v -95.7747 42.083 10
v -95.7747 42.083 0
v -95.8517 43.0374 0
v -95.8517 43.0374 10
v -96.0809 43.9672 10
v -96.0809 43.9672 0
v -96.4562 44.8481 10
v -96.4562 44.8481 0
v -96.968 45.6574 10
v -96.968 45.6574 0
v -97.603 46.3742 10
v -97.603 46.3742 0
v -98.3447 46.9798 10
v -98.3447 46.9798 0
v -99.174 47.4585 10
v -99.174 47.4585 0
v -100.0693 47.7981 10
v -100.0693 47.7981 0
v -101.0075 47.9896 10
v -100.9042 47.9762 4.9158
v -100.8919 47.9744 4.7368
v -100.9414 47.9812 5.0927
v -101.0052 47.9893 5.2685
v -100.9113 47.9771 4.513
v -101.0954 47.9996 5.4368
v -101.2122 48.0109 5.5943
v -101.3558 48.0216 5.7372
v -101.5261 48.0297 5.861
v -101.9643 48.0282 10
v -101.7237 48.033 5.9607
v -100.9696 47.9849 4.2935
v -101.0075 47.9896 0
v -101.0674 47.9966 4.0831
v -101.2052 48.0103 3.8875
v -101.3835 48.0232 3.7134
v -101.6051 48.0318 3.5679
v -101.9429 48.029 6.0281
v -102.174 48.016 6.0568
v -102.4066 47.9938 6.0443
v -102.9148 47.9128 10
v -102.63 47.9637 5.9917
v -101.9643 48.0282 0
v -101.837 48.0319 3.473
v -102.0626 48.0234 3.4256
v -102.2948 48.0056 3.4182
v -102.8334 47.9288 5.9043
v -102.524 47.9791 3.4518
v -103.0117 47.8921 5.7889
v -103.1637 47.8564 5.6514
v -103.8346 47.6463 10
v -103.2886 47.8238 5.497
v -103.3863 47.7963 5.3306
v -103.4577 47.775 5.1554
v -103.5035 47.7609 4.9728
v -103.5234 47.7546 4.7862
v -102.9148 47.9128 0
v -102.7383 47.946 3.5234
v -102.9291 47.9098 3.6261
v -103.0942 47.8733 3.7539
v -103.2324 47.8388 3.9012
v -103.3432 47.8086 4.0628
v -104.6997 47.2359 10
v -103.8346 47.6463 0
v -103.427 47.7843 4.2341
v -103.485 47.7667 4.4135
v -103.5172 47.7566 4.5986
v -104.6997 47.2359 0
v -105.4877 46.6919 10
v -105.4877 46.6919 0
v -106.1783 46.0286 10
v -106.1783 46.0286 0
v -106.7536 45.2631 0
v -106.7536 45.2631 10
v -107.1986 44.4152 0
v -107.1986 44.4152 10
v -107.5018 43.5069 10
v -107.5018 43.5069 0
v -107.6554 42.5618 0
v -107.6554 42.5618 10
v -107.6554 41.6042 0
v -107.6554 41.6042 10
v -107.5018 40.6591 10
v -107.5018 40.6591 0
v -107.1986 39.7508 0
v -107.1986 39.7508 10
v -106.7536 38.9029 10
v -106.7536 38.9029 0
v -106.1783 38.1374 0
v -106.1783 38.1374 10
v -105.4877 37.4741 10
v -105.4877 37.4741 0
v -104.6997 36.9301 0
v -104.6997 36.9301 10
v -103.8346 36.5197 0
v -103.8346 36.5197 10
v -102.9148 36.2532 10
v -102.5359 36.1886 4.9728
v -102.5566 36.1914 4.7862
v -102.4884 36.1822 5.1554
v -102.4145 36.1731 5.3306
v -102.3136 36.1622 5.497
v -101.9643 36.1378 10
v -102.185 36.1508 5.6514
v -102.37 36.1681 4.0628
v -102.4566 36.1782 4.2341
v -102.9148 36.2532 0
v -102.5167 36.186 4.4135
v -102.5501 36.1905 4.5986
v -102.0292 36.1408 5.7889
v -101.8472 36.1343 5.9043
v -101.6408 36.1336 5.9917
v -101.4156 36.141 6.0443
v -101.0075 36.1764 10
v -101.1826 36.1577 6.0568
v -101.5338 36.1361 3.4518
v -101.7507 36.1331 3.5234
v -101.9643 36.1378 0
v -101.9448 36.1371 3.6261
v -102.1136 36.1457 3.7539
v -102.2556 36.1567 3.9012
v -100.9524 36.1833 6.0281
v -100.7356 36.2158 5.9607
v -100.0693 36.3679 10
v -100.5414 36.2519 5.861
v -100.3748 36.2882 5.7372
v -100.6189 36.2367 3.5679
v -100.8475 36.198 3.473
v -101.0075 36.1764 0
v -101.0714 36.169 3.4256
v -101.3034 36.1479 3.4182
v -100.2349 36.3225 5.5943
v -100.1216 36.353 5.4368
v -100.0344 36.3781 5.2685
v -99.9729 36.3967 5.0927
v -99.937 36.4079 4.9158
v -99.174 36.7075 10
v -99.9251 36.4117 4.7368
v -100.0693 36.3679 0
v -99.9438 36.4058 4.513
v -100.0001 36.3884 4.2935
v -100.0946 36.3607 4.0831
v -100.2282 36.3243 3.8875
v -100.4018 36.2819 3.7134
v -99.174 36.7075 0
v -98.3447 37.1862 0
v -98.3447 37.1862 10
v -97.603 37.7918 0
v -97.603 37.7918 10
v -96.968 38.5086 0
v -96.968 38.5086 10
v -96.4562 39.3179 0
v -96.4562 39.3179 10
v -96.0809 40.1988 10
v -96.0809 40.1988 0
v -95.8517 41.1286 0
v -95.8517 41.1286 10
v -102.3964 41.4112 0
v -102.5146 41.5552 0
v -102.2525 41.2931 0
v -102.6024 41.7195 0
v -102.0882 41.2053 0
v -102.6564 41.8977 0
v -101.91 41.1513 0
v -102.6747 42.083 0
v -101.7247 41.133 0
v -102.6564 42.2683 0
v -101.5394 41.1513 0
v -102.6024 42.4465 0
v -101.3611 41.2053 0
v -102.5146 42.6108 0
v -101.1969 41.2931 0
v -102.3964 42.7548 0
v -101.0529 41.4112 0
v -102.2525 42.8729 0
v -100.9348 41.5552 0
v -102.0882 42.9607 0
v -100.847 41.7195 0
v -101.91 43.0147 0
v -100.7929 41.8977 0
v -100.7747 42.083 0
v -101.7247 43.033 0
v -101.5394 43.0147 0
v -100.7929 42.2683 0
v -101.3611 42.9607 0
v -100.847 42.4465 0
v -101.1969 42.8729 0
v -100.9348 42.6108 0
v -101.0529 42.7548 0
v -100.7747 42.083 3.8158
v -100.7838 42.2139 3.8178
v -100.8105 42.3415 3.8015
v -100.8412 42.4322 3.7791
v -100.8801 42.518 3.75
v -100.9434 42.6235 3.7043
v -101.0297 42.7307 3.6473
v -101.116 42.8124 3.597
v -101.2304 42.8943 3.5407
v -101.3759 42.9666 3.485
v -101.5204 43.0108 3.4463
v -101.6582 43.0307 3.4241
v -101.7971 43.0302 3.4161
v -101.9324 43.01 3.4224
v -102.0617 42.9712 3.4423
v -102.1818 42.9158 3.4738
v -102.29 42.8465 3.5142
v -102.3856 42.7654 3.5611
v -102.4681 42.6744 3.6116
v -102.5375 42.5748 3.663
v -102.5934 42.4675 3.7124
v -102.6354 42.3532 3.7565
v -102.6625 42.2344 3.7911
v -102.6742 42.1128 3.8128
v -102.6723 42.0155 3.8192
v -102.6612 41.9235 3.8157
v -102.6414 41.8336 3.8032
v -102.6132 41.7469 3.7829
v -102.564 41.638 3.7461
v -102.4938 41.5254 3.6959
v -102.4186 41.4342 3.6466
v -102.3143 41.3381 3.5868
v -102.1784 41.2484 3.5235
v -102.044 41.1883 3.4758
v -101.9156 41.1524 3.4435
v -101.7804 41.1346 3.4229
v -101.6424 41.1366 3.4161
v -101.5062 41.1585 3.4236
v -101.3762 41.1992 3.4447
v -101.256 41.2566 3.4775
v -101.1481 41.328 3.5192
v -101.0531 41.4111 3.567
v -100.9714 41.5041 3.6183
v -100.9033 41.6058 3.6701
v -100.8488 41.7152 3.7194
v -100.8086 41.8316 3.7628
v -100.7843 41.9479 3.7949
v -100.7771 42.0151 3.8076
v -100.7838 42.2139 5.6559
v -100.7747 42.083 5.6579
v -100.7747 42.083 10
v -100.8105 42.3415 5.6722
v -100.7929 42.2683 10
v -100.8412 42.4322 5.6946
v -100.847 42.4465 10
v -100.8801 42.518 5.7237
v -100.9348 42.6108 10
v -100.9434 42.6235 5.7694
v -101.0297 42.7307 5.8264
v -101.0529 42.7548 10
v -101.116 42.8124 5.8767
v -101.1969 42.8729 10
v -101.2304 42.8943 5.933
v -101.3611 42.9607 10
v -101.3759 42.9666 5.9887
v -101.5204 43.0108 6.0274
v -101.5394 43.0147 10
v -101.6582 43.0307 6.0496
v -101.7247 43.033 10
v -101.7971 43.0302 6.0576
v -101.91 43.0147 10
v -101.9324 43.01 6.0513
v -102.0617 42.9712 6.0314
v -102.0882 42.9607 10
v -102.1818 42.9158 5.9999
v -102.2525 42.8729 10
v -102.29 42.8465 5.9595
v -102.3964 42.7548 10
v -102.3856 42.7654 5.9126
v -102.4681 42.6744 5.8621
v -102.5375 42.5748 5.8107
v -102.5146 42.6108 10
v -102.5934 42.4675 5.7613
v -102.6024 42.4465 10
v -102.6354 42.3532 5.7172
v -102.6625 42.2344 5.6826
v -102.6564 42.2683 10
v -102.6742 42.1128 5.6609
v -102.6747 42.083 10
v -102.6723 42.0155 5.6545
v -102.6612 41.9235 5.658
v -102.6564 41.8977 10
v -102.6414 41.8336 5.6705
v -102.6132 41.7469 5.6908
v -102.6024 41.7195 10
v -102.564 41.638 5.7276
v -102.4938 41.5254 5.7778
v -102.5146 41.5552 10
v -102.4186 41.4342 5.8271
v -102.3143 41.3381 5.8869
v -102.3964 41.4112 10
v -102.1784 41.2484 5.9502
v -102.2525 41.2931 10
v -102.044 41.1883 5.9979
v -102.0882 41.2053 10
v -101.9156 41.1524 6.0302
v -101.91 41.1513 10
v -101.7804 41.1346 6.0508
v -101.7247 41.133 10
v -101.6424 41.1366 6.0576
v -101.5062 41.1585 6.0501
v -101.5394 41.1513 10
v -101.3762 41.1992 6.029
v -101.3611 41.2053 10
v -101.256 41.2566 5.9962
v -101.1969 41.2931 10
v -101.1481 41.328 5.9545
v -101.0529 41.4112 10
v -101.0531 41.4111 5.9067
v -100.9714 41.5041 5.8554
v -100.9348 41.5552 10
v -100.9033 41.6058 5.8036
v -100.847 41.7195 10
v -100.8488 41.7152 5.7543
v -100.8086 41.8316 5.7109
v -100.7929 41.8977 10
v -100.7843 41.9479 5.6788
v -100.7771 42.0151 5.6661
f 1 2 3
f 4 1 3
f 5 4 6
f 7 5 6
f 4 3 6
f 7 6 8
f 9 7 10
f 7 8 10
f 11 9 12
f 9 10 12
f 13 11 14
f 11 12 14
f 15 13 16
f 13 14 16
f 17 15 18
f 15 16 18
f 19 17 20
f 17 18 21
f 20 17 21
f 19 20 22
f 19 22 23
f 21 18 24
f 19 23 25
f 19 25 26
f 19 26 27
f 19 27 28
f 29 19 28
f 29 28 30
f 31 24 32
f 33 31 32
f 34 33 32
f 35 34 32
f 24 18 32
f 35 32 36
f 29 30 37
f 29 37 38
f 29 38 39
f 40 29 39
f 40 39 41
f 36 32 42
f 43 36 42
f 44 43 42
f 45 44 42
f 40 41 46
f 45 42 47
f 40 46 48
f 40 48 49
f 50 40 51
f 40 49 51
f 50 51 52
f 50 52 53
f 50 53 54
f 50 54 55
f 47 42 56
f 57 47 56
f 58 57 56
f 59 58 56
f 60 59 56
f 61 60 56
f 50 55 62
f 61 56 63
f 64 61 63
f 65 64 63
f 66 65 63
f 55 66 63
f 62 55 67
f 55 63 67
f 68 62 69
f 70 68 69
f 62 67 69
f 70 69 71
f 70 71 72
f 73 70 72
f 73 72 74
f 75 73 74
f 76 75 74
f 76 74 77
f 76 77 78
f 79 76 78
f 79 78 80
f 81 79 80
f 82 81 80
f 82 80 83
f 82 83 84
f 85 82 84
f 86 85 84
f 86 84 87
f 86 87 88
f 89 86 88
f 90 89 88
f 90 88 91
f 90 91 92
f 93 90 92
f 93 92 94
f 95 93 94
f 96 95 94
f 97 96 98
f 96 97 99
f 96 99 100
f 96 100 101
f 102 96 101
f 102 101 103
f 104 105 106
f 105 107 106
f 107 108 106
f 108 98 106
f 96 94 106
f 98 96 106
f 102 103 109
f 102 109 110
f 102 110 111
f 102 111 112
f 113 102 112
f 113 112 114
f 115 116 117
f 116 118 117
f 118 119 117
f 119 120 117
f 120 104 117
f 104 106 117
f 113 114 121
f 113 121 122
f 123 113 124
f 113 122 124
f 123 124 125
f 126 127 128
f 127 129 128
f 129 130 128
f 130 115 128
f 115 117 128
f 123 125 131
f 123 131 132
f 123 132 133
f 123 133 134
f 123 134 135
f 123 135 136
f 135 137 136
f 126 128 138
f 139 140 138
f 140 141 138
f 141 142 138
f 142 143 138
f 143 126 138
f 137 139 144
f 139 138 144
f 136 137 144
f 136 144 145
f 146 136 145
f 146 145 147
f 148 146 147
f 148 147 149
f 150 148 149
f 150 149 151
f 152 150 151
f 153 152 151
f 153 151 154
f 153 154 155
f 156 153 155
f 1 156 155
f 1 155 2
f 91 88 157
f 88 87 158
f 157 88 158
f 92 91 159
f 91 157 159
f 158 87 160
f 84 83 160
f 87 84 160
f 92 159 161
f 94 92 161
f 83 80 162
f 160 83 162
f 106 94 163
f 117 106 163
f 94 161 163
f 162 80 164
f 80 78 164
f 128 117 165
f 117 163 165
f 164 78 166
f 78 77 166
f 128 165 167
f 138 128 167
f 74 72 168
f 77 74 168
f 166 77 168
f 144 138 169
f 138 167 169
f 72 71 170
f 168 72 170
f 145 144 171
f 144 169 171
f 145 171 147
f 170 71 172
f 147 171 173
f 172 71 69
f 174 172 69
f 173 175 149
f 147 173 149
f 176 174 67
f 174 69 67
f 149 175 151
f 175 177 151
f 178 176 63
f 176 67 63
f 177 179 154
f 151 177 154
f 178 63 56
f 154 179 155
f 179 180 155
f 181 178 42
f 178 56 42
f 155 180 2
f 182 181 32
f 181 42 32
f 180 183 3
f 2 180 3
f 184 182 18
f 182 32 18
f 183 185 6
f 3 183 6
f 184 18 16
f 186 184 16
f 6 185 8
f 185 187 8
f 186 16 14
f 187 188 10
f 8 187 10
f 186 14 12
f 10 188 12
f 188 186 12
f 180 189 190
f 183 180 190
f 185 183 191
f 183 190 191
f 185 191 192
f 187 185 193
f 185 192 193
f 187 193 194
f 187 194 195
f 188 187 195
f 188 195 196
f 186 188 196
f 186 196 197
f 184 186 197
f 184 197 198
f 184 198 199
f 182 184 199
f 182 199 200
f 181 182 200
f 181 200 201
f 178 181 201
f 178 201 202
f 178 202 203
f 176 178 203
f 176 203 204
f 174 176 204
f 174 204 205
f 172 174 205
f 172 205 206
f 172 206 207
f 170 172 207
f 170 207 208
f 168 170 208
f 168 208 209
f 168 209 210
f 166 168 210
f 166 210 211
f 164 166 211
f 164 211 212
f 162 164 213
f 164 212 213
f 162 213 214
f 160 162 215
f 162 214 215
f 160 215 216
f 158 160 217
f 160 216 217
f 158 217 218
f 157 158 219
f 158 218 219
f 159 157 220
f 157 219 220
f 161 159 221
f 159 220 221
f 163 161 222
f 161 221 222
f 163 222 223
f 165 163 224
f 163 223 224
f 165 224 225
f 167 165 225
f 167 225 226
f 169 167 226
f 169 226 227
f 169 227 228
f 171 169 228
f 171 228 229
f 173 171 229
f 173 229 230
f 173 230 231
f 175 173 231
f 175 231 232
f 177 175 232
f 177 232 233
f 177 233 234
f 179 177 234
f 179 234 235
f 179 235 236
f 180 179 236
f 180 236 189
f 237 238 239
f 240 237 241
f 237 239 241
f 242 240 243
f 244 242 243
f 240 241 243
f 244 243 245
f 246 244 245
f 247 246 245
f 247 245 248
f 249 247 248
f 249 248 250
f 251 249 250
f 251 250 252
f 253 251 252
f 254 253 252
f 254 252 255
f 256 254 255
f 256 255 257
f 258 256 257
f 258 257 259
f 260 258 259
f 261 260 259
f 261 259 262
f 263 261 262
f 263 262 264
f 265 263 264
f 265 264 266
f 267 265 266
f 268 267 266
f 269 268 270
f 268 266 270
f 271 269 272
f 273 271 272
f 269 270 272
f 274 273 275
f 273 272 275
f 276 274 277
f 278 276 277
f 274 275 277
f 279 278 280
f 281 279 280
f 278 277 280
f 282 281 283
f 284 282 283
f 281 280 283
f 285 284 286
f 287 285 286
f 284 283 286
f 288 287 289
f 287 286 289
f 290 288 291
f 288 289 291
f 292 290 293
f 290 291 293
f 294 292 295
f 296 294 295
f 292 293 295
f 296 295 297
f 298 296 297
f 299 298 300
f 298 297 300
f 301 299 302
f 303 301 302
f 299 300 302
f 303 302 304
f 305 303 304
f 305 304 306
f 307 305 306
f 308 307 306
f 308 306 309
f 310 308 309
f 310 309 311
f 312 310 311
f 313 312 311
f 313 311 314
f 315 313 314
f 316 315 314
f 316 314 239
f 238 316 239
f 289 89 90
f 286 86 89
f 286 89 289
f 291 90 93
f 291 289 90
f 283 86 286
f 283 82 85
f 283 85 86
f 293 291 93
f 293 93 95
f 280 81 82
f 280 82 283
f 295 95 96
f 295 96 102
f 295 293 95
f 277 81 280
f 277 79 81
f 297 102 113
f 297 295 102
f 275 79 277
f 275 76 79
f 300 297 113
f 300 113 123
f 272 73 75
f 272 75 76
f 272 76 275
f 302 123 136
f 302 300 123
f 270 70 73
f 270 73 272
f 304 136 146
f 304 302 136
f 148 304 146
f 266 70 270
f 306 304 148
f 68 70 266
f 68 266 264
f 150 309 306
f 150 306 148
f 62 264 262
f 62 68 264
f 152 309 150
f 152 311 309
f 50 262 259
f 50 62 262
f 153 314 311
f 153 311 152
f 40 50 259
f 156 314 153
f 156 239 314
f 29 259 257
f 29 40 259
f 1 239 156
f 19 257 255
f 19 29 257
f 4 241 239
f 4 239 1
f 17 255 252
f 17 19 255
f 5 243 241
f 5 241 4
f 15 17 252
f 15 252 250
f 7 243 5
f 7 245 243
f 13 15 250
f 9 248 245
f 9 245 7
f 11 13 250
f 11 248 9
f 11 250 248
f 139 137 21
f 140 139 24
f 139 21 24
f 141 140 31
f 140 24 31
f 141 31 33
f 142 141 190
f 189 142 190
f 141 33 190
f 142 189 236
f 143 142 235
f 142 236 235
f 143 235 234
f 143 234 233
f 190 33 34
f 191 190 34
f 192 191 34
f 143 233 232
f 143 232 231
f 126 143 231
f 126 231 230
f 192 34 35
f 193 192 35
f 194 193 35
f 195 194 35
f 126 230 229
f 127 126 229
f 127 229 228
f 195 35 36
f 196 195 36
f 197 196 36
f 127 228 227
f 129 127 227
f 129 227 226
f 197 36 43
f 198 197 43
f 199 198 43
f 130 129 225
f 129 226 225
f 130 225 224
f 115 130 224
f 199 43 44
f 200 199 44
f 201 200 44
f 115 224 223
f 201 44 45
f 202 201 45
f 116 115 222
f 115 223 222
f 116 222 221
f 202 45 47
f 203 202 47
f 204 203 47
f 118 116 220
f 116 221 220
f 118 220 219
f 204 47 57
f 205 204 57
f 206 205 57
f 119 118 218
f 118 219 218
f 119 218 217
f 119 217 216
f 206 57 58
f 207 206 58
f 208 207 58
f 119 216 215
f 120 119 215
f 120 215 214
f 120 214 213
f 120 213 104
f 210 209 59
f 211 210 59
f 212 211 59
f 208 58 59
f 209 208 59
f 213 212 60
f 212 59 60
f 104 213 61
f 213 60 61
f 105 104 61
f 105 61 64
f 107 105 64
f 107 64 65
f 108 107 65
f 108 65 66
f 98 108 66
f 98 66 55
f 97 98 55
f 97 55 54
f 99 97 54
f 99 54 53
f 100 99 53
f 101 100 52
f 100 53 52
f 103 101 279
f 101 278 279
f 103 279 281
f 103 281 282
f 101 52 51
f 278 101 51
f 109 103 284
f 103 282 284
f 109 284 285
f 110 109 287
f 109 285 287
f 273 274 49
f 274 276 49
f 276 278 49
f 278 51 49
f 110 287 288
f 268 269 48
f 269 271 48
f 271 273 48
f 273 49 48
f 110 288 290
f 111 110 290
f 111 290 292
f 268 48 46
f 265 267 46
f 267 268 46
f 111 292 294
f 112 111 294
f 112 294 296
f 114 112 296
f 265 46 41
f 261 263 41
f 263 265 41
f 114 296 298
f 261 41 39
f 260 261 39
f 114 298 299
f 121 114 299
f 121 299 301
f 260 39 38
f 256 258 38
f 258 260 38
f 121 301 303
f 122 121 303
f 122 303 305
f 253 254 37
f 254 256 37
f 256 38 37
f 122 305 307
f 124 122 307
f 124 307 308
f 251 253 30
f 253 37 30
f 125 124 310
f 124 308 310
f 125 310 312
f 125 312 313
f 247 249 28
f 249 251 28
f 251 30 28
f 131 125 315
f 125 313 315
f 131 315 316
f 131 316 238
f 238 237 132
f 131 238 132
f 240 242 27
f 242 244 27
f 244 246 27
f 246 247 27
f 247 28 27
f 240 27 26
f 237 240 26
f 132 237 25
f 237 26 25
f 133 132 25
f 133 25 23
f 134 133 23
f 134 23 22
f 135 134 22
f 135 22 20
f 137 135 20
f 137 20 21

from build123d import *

# Parameters (mm, degrees)
SKETCH1_R                   = 5.95
BOSS_EXTRUDE2_DEPTH         = 10
SKETCH12_R                  = 0.95
CUT_EXTRUDE3_DEPTH          = 10
F_37_0_104_DIAMETER_HOLE1_D = 2.6416


with BuildPart() as part:
    # Sketch1 → Boss-Extrude2 (new body)
    with BuildSketch(Plane.XY):
        with Locations((-101.724686529, 42.083000392)):
            Circle(SKETCH1_R)
    extrude(amount=BOSS_EXTRUDE2_DEPTH)

    # Sketch12 → Cut-Extrude3 (cut)
    with BuildSketch(Plane.XY.offset(10)):
        with Locations((-101.724686529, 42.083000392)):
            Circle(SKETCH12_R)
    extrude(amount=-CUT_EXTRUDE3_DEPTH, mode=Mode.SUBTRACT)

    # #37 (0.104) Diameter Hole1 (through all)
    with Locations(Plane(origin=(-101.228935977, 36.153689185, 4.736849069), x_dir=(-0.996522891944, -0.083319420496, 0), z_dir=(0.083319420496, -0.996522891944, 0))):
        with Locations((0, 0)):
            Hole(F_37_0_104_DIAMETER_HOLE1_D / 2)


solid = part.part
